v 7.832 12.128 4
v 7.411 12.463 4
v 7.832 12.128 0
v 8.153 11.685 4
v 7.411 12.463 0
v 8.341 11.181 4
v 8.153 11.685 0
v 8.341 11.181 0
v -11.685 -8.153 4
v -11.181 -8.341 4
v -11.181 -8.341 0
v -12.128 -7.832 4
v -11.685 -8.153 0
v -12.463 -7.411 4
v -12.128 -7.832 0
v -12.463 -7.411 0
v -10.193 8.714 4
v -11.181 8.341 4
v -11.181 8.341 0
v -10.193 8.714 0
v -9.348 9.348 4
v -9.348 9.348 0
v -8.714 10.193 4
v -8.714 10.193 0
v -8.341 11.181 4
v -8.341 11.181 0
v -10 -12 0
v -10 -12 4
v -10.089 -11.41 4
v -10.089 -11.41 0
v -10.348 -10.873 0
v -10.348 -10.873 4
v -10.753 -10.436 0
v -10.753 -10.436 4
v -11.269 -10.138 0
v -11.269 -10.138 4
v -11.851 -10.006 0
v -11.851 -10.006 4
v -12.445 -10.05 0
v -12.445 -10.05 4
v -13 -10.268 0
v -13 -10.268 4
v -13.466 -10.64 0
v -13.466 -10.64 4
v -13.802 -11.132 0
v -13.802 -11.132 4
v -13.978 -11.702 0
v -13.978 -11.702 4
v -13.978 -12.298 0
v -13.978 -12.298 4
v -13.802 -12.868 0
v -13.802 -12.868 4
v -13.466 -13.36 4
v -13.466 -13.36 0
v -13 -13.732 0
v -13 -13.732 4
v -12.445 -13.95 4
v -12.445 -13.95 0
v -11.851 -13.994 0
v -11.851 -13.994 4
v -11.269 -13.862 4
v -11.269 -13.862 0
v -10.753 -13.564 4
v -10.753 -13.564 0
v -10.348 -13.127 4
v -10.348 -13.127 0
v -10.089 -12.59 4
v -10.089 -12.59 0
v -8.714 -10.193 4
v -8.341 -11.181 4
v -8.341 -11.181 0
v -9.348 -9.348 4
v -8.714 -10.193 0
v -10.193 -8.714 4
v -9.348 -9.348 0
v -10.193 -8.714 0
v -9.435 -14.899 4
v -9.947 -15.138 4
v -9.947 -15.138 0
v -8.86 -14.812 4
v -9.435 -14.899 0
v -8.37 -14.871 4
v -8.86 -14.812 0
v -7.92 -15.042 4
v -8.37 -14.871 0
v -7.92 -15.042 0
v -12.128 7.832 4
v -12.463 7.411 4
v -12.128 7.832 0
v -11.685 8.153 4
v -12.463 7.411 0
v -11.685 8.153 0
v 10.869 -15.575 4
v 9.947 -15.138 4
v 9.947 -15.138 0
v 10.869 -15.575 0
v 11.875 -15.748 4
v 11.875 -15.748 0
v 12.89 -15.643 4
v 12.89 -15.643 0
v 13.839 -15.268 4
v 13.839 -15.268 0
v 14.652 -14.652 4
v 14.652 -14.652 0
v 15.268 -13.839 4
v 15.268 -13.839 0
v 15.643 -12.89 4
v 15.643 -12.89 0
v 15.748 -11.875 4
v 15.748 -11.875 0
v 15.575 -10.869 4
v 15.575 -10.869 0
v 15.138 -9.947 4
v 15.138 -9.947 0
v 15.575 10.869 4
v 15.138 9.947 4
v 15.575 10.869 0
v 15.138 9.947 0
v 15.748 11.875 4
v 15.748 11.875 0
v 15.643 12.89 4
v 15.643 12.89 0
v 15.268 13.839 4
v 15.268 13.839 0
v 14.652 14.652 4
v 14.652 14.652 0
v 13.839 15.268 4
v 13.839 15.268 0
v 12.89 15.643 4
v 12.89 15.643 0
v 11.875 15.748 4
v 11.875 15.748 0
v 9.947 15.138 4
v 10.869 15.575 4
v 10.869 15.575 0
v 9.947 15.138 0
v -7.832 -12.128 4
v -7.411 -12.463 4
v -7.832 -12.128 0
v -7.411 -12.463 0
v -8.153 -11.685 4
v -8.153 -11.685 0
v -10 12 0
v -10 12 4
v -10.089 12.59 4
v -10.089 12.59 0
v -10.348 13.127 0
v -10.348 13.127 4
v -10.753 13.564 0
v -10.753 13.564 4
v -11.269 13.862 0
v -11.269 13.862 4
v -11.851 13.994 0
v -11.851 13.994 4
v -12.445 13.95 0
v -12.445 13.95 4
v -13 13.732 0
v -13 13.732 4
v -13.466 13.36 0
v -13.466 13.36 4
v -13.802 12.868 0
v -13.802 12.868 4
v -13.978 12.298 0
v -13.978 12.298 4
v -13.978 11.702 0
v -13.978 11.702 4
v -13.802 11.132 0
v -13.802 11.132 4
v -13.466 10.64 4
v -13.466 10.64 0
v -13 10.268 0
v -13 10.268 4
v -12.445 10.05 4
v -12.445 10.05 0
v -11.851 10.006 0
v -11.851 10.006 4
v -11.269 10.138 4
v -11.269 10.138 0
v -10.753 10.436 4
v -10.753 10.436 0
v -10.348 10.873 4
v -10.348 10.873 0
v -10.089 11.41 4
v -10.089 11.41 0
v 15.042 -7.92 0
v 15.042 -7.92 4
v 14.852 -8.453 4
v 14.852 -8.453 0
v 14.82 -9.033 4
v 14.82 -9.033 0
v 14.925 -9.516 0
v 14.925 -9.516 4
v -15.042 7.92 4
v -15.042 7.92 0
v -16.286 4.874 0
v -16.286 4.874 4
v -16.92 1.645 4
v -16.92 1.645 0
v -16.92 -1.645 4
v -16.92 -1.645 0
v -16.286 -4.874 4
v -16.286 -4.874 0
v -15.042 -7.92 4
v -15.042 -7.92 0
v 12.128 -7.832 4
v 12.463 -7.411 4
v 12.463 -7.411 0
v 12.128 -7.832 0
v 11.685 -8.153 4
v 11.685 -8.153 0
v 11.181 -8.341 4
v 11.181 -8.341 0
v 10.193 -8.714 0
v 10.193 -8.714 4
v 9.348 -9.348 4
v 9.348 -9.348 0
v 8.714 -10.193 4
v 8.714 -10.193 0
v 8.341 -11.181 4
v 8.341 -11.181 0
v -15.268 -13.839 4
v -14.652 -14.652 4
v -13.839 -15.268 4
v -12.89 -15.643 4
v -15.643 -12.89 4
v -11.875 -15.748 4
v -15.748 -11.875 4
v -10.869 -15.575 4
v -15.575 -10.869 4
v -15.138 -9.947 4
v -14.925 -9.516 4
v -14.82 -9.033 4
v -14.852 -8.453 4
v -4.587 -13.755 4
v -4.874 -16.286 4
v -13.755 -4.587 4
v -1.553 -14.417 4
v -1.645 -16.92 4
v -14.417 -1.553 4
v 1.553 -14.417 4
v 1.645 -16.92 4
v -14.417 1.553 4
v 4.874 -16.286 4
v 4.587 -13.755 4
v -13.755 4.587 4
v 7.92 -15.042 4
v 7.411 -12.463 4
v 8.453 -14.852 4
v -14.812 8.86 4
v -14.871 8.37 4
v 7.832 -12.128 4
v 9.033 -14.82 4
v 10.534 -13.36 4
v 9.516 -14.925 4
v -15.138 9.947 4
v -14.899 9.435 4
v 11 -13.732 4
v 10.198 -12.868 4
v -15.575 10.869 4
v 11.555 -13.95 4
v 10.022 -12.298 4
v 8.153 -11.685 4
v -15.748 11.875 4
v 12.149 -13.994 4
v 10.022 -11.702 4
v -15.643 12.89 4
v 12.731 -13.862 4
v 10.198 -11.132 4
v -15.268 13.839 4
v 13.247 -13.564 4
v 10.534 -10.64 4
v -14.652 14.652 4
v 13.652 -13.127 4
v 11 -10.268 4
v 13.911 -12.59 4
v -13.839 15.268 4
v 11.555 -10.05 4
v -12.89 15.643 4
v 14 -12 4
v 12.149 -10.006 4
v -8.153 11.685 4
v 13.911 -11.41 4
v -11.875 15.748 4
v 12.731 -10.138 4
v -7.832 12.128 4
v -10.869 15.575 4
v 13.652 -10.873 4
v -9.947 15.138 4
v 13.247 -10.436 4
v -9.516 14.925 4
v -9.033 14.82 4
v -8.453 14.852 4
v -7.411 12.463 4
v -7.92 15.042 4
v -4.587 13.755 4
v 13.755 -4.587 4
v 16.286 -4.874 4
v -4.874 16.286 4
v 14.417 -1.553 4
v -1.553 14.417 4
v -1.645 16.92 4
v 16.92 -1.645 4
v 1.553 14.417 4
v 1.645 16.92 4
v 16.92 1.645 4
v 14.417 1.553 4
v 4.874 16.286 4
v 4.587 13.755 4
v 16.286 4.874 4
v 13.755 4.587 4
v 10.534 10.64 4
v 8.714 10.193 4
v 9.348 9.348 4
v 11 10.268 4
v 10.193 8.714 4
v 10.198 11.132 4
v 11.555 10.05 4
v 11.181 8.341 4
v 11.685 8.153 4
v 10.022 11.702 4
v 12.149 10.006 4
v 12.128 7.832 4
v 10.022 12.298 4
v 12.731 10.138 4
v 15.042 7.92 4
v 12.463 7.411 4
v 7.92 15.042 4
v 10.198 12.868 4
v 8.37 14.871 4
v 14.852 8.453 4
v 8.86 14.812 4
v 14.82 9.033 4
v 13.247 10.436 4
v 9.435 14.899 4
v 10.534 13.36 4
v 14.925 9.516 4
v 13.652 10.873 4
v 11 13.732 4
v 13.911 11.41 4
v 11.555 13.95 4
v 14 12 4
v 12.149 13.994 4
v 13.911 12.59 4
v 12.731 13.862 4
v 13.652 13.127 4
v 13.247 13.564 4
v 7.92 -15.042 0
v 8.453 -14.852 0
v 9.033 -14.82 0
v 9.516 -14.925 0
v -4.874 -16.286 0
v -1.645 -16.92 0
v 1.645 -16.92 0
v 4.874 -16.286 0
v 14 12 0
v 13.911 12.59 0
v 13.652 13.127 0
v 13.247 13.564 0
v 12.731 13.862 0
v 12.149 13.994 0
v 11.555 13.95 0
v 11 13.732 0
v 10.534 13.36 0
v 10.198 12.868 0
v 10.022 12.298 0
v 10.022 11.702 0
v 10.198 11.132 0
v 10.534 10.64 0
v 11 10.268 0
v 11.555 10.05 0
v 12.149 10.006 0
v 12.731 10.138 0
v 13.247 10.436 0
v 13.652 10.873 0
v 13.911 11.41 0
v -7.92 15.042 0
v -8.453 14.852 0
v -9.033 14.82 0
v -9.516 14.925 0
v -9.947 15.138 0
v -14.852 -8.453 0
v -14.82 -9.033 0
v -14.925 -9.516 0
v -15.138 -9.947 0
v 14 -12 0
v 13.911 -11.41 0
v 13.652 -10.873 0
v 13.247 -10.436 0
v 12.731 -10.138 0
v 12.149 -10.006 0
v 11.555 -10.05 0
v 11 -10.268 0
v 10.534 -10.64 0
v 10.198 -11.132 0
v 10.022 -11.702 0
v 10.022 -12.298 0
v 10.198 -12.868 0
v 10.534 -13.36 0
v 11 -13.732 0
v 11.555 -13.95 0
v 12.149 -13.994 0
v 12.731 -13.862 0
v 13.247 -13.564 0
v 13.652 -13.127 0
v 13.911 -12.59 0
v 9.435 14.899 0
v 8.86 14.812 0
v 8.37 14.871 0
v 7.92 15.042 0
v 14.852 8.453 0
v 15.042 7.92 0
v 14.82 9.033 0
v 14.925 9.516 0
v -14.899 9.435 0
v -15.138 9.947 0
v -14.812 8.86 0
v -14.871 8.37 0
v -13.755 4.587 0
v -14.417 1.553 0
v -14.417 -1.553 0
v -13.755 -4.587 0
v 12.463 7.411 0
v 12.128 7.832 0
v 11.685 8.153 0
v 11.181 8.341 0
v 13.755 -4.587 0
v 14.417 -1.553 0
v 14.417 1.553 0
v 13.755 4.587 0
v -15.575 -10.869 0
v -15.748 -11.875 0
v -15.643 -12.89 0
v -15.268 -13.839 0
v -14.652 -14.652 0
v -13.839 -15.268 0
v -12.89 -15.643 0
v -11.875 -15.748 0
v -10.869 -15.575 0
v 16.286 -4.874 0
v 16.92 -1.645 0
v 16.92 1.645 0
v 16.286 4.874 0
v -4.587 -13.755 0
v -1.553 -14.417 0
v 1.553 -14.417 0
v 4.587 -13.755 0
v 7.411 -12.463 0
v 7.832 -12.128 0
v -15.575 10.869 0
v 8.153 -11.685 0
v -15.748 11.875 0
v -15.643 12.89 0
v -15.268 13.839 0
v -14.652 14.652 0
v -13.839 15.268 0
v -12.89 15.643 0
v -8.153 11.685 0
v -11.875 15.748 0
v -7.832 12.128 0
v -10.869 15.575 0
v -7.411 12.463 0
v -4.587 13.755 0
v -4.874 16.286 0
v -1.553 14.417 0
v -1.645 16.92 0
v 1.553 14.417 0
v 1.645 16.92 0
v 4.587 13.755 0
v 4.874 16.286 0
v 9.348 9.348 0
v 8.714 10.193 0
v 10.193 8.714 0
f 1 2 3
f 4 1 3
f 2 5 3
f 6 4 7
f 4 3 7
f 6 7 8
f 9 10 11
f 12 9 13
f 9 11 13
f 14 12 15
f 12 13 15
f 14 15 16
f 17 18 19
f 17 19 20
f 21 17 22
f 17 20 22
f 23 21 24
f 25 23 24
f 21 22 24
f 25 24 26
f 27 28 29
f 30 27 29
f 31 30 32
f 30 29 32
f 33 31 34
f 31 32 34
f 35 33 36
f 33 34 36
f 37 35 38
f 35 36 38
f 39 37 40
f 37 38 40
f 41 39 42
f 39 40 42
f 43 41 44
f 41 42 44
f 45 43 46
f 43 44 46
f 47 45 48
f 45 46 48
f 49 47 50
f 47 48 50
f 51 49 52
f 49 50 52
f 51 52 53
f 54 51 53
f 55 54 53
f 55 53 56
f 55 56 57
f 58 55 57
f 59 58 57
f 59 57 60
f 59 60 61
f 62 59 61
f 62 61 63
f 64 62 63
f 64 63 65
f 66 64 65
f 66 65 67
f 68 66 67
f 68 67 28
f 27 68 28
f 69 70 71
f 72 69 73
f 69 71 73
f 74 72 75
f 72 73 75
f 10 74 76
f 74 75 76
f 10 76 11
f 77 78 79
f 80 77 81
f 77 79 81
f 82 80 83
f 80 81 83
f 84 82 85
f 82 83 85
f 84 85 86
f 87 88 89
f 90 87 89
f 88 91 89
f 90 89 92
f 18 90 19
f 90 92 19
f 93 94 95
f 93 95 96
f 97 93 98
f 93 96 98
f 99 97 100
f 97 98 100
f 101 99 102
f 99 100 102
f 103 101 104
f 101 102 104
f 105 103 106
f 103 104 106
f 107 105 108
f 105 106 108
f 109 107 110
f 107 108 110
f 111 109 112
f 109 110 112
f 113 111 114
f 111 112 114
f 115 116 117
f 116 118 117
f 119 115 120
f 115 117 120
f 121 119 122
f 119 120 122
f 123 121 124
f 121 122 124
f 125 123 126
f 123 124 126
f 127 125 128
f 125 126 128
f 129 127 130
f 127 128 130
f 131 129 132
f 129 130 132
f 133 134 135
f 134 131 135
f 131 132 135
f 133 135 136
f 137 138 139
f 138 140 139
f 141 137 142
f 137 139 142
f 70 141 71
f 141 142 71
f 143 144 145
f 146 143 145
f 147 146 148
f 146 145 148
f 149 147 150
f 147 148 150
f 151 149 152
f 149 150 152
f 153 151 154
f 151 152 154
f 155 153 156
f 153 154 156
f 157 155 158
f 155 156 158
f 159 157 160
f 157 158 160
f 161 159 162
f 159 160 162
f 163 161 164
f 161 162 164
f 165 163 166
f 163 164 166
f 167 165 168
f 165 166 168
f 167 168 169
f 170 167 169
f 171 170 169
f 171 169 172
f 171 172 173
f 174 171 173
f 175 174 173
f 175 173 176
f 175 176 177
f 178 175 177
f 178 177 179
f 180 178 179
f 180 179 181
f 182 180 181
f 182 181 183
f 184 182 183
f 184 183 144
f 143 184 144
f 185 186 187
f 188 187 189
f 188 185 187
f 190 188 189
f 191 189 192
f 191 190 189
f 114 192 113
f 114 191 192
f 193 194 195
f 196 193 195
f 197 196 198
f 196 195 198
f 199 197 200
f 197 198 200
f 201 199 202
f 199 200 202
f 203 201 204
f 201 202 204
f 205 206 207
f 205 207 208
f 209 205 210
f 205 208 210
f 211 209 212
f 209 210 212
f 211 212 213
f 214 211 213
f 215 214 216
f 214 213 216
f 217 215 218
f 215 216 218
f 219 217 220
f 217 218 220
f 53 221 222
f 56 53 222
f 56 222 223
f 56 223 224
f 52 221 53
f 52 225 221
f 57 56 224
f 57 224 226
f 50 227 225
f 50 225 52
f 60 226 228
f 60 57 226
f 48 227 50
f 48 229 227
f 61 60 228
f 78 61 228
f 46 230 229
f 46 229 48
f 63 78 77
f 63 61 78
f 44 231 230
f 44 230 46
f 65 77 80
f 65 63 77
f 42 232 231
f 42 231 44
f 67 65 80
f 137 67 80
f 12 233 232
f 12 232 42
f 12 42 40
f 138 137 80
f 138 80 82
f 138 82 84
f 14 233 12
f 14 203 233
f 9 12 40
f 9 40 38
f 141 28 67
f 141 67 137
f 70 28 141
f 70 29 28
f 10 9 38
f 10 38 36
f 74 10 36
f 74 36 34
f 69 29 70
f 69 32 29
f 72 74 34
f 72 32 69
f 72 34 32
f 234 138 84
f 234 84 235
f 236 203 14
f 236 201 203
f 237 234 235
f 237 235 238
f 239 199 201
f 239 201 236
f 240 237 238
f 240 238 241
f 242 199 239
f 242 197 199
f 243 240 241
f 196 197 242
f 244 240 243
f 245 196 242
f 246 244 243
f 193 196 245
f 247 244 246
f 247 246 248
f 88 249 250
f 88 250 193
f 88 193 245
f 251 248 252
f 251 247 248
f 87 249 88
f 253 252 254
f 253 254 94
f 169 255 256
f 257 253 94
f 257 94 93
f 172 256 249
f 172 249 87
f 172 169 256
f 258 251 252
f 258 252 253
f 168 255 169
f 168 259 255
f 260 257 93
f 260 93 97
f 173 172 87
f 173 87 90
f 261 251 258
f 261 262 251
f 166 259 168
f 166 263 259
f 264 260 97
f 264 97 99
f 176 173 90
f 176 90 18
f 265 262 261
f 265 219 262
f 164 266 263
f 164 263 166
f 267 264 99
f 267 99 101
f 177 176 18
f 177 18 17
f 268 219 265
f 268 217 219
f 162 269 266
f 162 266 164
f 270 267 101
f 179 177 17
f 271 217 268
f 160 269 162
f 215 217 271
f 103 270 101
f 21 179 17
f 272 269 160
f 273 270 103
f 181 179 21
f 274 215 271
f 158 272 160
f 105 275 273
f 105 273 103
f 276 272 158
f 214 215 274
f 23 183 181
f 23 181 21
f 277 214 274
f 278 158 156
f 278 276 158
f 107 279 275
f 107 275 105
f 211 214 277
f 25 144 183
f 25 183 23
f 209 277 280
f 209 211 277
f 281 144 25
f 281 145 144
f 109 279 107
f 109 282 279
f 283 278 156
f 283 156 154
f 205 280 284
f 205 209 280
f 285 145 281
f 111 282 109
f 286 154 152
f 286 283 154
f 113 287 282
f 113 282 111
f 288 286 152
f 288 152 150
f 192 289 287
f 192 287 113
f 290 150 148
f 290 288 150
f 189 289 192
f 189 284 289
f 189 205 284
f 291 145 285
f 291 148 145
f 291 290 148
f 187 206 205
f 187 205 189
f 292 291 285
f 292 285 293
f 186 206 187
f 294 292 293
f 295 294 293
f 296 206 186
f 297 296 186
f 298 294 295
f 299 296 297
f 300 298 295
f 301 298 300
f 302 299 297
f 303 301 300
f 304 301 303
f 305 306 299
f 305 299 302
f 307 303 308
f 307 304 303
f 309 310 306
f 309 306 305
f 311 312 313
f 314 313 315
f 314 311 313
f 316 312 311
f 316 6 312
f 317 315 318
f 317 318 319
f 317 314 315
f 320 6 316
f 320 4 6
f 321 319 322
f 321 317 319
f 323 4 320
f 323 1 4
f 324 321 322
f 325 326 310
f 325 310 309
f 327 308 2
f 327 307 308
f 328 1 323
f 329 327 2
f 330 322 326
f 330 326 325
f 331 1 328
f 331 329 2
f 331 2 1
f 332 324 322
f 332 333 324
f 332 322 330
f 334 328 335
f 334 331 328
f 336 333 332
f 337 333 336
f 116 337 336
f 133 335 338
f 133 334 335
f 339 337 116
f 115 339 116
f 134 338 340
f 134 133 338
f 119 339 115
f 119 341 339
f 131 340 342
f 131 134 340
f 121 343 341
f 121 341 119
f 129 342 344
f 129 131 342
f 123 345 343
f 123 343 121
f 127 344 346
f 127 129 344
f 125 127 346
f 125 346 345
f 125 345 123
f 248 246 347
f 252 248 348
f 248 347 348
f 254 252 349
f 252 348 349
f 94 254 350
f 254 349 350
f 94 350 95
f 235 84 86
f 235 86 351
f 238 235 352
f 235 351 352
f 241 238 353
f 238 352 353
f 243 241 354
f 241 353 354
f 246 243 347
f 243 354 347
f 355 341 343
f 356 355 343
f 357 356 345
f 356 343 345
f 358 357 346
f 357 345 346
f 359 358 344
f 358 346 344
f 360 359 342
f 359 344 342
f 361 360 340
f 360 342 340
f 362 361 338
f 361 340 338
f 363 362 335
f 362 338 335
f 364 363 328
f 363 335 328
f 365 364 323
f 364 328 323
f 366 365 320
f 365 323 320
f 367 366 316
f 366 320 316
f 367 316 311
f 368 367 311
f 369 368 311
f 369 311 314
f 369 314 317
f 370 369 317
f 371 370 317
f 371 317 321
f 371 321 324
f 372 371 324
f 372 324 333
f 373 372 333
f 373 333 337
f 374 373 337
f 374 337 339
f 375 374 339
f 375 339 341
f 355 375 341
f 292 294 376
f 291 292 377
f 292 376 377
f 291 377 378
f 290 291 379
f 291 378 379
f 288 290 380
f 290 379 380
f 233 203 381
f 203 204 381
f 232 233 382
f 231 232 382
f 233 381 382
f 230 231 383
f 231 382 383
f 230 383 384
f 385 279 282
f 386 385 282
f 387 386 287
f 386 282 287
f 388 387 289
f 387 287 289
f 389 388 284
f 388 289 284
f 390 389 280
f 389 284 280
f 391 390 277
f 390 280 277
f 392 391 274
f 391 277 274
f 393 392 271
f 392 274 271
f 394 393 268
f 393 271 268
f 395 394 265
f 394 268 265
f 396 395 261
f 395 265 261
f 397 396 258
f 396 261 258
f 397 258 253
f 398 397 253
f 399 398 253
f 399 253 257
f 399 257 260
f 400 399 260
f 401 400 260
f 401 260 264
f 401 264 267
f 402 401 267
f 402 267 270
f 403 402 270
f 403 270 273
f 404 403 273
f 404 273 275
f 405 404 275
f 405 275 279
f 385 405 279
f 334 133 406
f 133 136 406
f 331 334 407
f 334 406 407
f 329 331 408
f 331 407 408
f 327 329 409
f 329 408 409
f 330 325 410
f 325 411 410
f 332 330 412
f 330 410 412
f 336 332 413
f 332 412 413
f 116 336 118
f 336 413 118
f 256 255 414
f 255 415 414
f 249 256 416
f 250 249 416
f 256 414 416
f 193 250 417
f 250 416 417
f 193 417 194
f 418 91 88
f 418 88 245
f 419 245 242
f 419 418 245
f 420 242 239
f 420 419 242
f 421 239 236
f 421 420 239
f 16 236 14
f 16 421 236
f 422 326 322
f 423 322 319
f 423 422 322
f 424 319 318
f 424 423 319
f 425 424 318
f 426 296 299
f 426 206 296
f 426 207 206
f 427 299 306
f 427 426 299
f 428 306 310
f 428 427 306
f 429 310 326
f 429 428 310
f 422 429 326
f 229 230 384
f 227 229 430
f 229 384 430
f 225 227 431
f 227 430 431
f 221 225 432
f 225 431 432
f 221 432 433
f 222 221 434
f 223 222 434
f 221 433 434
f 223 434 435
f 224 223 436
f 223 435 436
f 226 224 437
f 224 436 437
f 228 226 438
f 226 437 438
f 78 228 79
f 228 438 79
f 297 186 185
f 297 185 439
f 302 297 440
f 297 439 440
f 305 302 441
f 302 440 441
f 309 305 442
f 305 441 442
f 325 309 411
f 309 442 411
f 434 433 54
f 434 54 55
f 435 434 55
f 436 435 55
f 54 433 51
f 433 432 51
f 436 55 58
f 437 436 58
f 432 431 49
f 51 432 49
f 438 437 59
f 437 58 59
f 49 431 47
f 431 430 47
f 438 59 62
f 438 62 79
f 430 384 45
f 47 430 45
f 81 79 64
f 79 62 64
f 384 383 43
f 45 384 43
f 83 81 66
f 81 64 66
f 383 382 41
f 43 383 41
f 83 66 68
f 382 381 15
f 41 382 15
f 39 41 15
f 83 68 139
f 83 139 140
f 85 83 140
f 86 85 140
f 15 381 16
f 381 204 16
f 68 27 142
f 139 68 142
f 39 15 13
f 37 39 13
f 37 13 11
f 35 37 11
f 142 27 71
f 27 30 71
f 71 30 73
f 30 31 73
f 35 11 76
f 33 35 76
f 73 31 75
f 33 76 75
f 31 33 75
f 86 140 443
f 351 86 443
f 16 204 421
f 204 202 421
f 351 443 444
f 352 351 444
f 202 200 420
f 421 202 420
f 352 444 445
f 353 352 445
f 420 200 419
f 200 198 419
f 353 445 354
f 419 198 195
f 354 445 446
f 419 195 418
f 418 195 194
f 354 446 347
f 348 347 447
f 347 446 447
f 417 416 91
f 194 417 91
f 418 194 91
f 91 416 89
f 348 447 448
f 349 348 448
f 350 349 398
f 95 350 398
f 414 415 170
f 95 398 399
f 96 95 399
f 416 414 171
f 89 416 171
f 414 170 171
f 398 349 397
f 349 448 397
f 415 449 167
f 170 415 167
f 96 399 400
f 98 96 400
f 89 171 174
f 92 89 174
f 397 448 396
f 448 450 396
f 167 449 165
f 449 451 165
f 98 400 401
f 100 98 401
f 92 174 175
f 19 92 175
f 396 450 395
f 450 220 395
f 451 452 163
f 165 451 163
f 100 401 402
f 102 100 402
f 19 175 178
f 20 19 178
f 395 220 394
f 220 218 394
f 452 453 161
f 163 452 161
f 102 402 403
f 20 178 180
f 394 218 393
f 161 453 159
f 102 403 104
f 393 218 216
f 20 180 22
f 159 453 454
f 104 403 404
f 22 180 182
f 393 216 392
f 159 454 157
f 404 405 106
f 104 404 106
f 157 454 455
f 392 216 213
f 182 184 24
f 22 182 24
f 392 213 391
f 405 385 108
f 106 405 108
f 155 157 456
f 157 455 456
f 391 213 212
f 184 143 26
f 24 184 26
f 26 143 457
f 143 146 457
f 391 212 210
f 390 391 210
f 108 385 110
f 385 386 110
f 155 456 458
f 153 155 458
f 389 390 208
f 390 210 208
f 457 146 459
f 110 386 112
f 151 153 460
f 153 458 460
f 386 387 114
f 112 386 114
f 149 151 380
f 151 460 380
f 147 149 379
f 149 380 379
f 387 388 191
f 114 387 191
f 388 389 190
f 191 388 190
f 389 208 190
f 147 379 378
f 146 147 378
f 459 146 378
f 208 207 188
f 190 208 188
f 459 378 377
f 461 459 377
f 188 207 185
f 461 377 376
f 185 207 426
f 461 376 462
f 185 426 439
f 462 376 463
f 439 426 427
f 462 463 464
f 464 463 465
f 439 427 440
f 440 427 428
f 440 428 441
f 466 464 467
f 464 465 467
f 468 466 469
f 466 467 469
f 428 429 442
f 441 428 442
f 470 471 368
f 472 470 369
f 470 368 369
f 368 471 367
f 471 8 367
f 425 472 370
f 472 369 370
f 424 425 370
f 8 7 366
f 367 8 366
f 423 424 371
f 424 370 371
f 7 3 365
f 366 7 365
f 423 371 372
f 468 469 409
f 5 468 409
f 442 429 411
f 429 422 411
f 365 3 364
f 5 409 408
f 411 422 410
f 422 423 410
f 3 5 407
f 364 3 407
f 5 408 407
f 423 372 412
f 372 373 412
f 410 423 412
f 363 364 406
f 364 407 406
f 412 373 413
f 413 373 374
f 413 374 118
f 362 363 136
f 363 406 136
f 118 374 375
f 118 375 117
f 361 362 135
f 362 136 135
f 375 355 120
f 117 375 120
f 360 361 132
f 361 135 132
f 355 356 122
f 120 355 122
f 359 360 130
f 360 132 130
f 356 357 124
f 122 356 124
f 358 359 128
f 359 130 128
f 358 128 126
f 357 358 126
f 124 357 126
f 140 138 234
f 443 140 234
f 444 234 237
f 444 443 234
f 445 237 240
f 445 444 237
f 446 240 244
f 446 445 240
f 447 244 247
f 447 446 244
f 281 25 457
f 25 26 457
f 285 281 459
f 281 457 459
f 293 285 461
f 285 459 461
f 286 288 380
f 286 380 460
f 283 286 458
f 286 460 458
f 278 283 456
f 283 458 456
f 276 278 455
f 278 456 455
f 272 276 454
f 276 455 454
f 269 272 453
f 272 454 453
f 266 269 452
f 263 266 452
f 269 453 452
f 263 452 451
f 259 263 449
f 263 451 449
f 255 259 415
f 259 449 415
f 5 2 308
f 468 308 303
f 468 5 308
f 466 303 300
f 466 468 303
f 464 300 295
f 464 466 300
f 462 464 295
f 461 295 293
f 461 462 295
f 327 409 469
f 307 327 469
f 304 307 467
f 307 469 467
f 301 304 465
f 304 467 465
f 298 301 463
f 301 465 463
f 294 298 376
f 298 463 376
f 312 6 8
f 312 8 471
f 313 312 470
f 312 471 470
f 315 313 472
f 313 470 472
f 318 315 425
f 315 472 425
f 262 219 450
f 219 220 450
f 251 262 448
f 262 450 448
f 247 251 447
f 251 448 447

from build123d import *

# Parameters (mm, degrees)
ESQUISSE2_R          = 3.75
BOSS_EXTRU_1_DEPTH   = 4
BOSS_EXTRU_1_2_DEPTH = 4
BOSS_EXTRU_1_3_DEPTH = 4
BOSS_EXTRU_1_4_DEPTH = 4
ESQUISSE3_R          = 17
ESQUISSE3_R_2        = 14.5
BOSS_EXTRU_2_DEPTH   = 4
CONG_1_R             = 2
CONG_2_R             = 2
PER_AGE1_D           = 4
PER_AGE1_DEPTH       = 93.98


with BuildPart() as part:
    # Esquisse2 → Boss.-Extru.1 (new body)
    with BuildSketch(Plane.XY):
        with Locations((-12, 12)):
            Circle(ESQUISSE2_R)
    extrude(amount=BOSS_EXTRU_1_DEPTH)



with BuildPart() as body_2:
    # Esquisse2 → Boss.-Extru.1 2 (new body)
    with BuildSketch(Plane.XY):
        with Locations((12, 12)):
            Circle(ESQUISSE2_R)
    extrude(amount=BOSS_EXTRU_1_2_DEPTH)


with BuildPart() as body_3:
    # Esquisse2 → Boss.-Extru.1 3 (new body)
    with BuildSketch(Plane.XY):
        with Locations((-12, -12)):
            Circle(ESQUISSE2_R)
    extrude(amount=BOSS_EXTRU_1_3_DEPTH)


with BuildPart() as body_4:
    # Esquisse2 → Boss.-Extru.1 4 (new body)
    with BuildSketch(Plane.XY):
        with Locations((12, -12)):
            Circle(ESQUISSE2_R)
    extrude(amount=BOSS_EXTRU_1_4_DEPTH)


with BuildPart() as part_1:
    add(part.part)

    add(body_2.part)  # Boss.-Extru.2 merges body 2

    add(body_3.part)  # Boss.-Extru.2 merges body 3

    add(body_4.part)  # Boss.-Extru.2 merges body 4
    # Esquisse3 → Boss.-Extru.2 (add)
    with BuildSketch(Plane.XY):
        Circle(ESQUISSE3_R)
        Circle(ESQUISSE3_R_2, mode=Mode.SUBTRACT)
    extrude(amount=BOSS_EXTRU_2_DEPTH)

    # Congé1
    cong_1_edges = [part_1.edges().sort_by_distance(p)[0] for p in [
        (-14.365513596, 9.09021557, 2),
        (-9.09021557, 14.365513596, 2),
        (14.365513596, 9.09021557, 2),
        (9.09021557, 14.365513596, 2),
        (-14.365513596, -9.09021557, 2),
        (-9.09021557, -14.365513596, 2),
        (9.09021557, -14.365513596, 2),
        (14.365513596, -9.09021557, 2),
    ]]
    fillet(cong_1_edges, radius=CONG_1_R)

    # Congé2
    cong_2_edges = [part_1.edges().sort_by_distance(p)[0] for p in [
        (-11.92370292, 8.250776246, 2),
        (-8.250776246, 11.92370292, 2),
        (8.250776246, 11.92370292, 2),
        (11.92370292, 8.250776246, 2),
        (-11.92370292, -8.250776246, 2),
        (-8.250776246, -11.92370292, 2),
        (8.250776246, -11.92370292, 2),
        (11.92370292, -8.250776246, 2),
    ]]
    fillet(cong_2_edges, radius=CONG_2_R)

    # Perçage1
    with Locations(Plane(origin=(0, 0, 0), x_dir=(-1, 0, 0), z_dir=(0, 0, -1))):
        with Locations((-12, 12), (12, 12), (12, -12), (-12, -12)):
            Hole(PER_AGE1_D / 2, depth=PER_AGE1_DEPTH)


solid = part_1.part
